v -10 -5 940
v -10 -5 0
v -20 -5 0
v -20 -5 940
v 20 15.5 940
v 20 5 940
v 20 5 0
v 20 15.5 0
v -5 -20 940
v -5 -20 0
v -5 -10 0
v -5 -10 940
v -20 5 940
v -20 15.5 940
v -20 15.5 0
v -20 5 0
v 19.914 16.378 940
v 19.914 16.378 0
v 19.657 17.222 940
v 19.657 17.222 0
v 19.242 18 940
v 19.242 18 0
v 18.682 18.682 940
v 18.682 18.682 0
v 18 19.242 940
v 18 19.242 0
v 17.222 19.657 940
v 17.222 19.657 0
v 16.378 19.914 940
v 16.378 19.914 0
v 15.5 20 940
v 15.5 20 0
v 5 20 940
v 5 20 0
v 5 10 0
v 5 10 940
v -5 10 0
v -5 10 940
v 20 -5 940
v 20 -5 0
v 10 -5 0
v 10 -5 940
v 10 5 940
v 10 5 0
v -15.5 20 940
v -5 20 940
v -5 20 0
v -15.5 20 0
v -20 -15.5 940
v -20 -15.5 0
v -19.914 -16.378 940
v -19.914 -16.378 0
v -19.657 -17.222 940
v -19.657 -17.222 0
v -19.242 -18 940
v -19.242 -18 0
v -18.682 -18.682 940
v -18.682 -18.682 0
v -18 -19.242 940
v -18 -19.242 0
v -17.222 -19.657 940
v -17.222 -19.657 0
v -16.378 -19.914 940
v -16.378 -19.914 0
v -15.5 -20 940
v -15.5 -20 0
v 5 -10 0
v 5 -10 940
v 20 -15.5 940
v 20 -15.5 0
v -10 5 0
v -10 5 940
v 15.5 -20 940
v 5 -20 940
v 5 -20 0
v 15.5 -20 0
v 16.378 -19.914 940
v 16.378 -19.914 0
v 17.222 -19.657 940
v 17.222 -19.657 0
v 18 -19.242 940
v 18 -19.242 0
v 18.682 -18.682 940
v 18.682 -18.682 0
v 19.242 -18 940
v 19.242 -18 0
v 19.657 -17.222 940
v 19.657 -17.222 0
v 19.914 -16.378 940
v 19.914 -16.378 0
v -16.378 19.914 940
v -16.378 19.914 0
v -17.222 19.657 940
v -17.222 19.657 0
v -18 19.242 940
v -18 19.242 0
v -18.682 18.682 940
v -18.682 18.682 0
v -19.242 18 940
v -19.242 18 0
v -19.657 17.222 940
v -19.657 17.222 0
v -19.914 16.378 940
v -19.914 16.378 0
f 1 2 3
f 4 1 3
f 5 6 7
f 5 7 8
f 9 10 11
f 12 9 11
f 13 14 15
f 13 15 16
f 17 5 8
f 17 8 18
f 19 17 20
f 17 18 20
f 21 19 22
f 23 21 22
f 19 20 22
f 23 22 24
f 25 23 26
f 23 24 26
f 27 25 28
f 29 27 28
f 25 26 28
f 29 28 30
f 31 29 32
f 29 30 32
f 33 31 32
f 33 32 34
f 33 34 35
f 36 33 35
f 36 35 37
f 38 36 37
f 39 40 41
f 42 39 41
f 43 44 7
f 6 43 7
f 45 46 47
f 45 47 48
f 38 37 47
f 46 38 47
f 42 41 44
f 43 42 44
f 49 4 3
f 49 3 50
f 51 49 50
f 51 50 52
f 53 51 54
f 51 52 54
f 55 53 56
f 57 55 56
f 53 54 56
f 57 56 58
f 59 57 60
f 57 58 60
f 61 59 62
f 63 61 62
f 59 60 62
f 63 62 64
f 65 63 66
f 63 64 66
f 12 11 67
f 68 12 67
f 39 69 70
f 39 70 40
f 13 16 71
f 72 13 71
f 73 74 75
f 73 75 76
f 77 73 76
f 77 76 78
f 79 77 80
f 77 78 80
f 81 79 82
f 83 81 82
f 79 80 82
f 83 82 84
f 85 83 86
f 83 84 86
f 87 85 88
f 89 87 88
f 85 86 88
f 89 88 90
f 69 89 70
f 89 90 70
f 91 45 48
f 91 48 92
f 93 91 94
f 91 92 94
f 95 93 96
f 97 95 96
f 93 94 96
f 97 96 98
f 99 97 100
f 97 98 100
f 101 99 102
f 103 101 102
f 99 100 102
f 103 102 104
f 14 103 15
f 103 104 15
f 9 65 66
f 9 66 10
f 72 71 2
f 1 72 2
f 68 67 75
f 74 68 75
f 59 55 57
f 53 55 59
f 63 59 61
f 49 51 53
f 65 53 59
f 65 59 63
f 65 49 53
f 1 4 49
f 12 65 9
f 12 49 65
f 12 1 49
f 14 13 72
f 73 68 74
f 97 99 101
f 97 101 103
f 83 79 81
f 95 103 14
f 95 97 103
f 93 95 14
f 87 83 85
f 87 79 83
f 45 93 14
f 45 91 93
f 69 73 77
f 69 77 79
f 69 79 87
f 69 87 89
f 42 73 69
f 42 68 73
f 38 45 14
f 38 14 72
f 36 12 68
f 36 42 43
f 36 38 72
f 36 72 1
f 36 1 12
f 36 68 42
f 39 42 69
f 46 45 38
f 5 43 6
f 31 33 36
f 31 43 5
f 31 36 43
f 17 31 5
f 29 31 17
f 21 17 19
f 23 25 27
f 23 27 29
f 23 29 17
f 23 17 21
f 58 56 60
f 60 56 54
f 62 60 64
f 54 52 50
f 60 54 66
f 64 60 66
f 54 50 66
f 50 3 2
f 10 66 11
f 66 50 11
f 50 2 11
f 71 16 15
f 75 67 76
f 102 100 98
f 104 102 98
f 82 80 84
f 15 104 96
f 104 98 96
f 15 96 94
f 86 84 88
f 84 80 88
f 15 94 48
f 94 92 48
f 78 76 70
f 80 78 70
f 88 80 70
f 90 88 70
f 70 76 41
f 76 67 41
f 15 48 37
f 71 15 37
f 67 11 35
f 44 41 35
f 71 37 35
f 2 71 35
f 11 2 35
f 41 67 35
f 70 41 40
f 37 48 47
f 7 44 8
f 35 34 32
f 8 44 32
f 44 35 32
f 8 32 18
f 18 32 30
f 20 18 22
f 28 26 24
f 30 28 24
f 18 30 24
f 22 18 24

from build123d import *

# Parameters (mm, degrees)
BOSS_EXTRUDE1_DEPTH = 940


with BuildPart() as part:
    # Sketch1 → Boss-Extrude1 (new body)
    with BuildSketch(Plane.XY):
        with BuildLine():
            Line((-15.5, -20), (-5, -20))
            Line((-5, -20), (-5, -10))
            Line((-5, -10), (5, -10))
            Line((5, -10), (5, -20))
            Line((5, -20), (15.5, -20))
            ThreePointArc((15.5, -20), (18.681980515, -18.681980515), (20, -15.5))
            Line((20, -15.5), (20, -5))
            Line((20, -5), (10, -5))
            Line((10, -5), (10, 5))
            Line((10, 5), (20, 5))
            Line((20, 5), (20, 15.5))
            ThreePointArc((20, 15.5), (18.681980515, 18.681980515), (15.5, 20))
            Line((15.5, 20), (5, 20))
            Line((5, 20), (5, 10))
            Line((5, 10), (-5, 10))
            Line((-5, 10), (-5, 20))
            Line((-5, 20), (-8, 20))
            Line((-8, 20), (-15, 20))
            Line((-15, 20), (-15.5, 20))
            ThreePointArc((-15.5, 20), (-18.681980515, 18.681980515), (-20, 15.5))
            Line((-20, 15.5), (-20, 5))
            Line((-20, 5), (-10, 5))
            Line((-10, 5), (-10, -5))
            Line((-10, -5), (-20, -5))
            Line((-20, -5), (-20, -15.5))
            ThreePointArc((-20, -15.5), (-18.681980515, -18.681980515), (-15.5, -20))
        make_face()
    extrude(amount=BOSS_EXTRUDE1_DEPTH)


solid = part.part
